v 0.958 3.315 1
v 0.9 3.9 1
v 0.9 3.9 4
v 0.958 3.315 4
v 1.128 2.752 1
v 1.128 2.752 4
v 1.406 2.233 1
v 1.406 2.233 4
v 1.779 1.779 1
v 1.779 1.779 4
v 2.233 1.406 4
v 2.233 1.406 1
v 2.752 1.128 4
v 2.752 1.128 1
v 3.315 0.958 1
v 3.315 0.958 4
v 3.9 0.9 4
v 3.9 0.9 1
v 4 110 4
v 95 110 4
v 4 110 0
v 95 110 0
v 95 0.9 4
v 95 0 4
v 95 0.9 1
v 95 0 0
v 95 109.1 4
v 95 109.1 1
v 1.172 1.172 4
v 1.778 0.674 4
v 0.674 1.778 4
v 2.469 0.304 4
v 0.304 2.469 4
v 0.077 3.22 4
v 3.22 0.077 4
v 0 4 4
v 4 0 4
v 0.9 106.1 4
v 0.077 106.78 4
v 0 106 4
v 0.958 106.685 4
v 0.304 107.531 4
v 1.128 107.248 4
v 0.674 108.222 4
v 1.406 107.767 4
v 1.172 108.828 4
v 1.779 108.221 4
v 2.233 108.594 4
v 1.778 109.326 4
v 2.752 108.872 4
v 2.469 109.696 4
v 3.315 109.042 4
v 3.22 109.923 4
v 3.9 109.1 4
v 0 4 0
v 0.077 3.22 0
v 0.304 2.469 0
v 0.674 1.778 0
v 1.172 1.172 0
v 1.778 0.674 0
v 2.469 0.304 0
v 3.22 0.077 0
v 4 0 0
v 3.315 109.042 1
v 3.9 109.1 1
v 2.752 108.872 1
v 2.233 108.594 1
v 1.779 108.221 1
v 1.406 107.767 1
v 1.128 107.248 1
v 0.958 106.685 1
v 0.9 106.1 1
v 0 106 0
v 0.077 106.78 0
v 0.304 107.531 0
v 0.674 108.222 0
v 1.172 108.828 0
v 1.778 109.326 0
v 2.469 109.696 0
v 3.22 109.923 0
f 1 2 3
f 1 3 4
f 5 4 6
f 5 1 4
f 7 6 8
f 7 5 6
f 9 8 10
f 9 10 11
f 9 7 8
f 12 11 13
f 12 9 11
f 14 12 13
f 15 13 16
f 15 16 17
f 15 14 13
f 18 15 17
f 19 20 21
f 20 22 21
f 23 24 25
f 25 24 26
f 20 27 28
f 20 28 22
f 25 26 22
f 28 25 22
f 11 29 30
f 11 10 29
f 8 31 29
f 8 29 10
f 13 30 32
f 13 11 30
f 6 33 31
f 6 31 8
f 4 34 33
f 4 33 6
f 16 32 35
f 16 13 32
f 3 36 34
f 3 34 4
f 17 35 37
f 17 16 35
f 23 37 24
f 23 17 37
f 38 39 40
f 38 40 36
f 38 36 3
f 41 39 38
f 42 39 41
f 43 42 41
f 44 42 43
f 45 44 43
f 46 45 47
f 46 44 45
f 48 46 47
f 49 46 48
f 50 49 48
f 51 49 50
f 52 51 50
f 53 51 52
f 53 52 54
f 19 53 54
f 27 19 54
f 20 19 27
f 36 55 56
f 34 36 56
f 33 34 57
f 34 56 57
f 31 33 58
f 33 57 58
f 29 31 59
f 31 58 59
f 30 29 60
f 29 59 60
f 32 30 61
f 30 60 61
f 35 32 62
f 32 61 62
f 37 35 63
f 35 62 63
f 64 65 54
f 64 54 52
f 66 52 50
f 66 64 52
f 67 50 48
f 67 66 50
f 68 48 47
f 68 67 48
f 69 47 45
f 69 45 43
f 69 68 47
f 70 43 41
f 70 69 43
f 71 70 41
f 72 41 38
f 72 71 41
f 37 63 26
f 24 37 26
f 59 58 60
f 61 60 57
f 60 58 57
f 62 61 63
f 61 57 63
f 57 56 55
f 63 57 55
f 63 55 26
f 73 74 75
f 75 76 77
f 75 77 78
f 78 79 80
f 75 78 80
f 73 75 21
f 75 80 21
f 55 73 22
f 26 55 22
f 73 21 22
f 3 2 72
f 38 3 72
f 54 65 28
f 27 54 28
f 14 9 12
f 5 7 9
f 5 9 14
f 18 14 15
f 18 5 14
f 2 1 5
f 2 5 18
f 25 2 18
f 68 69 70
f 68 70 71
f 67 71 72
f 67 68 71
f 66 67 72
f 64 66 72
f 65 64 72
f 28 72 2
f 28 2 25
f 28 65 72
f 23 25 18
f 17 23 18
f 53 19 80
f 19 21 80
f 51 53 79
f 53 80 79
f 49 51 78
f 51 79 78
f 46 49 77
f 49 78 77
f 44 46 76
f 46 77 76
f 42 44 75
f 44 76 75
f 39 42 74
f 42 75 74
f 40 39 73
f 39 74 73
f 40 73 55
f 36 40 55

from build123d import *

# Parameters (mm, degrees)
PAD_DEPTH    = 1
PAD001_DEPTH = 3


with BuildPart() as part:
    # Sketch → Pad (new body)
    with BuildSketch(Plane.XY):
        with BuildLine():
            Line((4, 0), (95, 0))
            Line((95, 110), (95, 0))
            Line((95, 110), (4, 110))
            ThreePointArc((4, 110), (1.171573, 108.828427), (0, 106))
            Line((0, 106), (0, 4))
            ThreePointArc((0, 4), (1.171573, 1.171573), (4, 0))
        make_face()
    extrude(amount=PAD_DEPTH)

    # Sketch001 → Pad001 (new body)
    with BuildSketch(Plane.XY.offset(1)):
        with BuildLine():
            Line((4, 0), (95, 0))
            Line((95, 0), (95, 0.9))
            Line((95, 0.9), (3.9, 0.9))
            ThreePointArc((0.9, 3.9), (1.77868, 1.77868), (3.9, 0.9))
            Line((0.9, 3.9), (0.9, 106.1))
            ThreePointArc((3.9, 109.1), (1.77868, 108.22132), (0.9, 106.1))
            Line((3.9, 109.1), (95, 109.1))
            Line((95, 109.1), (95, 110))
            Line((95, 110), (4, 110))
            ThreePointArc((4, 110), (1.171573, 108.828427), (0, 106))
            Line((0, 106), (0, 4))
            ThreePointArc((0, 4), (1.171573, 1.171573), (4, 0))
        make_face()
    extrude(amount=PAD001_DEPTH)


solid = part.part
